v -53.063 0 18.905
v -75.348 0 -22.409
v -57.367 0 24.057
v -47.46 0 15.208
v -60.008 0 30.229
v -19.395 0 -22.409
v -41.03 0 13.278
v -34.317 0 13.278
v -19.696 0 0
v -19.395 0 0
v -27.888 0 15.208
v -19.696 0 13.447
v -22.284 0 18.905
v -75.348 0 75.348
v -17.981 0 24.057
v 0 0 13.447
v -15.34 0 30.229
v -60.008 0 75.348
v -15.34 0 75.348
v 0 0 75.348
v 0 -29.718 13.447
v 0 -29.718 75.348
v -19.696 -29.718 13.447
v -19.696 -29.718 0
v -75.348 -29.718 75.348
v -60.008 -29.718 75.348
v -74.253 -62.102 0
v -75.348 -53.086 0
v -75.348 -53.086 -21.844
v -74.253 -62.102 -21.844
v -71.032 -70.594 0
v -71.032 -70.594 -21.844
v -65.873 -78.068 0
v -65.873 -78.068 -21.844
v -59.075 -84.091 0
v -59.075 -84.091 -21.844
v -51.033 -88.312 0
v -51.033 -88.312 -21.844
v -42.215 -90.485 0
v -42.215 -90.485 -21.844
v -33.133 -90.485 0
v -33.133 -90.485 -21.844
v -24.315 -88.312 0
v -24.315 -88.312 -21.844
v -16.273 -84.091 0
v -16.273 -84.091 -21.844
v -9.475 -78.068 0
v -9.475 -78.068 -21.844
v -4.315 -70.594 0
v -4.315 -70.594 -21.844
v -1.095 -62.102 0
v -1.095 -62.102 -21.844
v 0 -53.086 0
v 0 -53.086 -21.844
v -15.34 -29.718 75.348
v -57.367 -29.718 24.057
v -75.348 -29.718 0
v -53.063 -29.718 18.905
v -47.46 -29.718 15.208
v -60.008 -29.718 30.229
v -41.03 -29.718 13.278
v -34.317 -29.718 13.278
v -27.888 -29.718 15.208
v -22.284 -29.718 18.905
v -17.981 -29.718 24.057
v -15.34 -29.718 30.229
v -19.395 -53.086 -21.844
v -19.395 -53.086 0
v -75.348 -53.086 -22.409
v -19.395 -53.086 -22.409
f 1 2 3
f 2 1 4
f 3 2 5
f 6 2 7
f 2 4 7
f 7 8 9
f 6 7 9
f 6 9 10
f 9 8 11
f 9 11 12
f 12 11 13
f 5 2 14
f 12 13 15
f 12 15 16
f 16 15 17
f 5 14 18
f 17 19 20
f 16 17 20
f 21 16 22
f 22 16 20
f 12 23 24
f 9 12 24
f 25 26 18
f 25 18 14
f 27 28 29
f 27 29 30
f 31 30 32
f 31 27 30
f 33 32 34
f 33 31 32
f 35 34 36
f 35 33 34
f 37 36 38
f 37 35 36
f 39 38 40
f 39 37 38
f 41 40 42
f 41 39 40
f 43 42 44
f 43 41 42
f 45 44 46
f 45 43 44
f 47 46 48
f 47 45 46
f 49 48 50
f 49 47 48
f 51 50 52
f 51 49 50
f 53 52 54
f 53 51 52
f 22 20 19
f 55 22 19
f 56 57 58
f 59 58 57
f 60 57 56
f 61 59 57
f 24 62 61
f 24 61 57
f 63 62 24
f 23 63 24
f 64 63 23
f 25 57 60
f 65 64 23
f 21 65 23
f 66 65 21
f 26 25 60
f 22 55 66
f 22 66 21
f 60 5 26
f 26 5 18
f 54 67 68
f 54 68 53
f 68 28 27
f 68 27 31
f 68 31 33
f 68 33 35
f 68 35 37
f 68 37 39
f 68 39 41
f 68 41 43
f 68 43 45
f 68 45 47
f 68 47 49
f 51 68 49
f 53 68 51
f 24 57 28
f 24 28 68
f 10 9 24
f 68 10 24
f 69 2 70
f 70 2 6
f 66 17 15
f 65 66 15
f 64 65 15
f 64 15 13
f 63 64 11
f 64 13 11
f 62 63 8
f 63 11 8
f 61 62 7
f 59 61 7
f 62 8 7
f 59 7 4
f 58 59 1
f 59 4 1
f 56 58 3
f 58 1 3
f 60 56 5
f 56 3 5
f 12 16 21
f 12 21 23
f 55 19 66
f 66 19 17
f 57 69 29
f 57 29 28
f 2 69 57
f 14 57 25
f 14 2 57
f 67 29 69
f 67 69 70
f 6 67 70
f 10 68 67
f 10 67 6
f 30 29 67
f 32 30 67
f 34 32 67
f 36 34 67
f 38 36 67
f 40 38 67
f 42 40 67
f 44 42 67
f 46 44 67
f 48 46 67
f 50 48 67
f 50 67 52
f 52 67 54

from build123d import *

# Parameters (mm, degrees)
F1_DEPTH = 29.718
F0_W     = 75.3477662802
F0_H     = 22.4088169634
F2_DEPTH = 53.086
F4_DEPTH = 21.844
F5_W     = 19.3952620029
F5_H     = 23.368
F6_DEPTH = 22.4098169634
F8_DEPTH = 29.719


with BuildPart() as f1:
    # F0 (on Front) → F1 (new body)
    with BuildSketch(Plane.XZ):
        with BuildLine():
            Line((-60.0075013936, 75.3477662802), (-75.3477662802, 75.3477662802))
            Line((-75.3477662802, 75.3477662802), (-75.3477662802, 0))
            Line((-75.3477662802, 0), (0, 0))
            Line((0, 0), (0, 75.3477662802))
            Line((0, 75.3477662802), (-15.3402648866, 75.3477662802))
            Line((-15.3402648866, 75.3477662802), (-15.3402648866, 30.2293412387))
            ThreePointArc((-15.3402648866, 30.2293412387), (-37.6738831401, 13.0326763907), (-60.0075013936, 30.2293412387))
            Line((-60.0075013936, 30.2293412387), (-60.0075013936, 75.3477662802))
        make_face()
    extrude(amount=F1_DEPTH)

    # F0 (on Front) → F2 (join)
    with BuildSketch(Plane.XZ):
        with Locations((-37.6738831401, -11.2044084817)):
            Rectangle(F0_W, F0_H)
    extrude(amount=F2_DEPTH)

    # F3 (on face) → F4 (join)
    with BuildSketch(Plane.XY):
        with BuildLine():
            Line((0, -53.086), (-75.3477662802, -53.086))
            ThreePointArc((-75.3477662802, -53.086), (-37.6738831401, -90.7598831401), (0, -53.086))
        make_face()
    extrude(amount=-F4_DEPTH)

    # F5 (on face) → F6 (cut, through all)
    with BuildSketch(Plane.XY):
        with Locations((-9.6976310015, -41.402)):
            Rectangle(F5_W, F5_H)
    extrude(amount=-F6_DEPTH, mode=Mode.SUBTRACT)

    # F7 (on face) → F8 (cut, through all)
    with BuildSketch(Plane.XZ.offset(29.718)):
        Polygon((0, 13.4468190372), (-19.6963120252, 13.4468190372), (-19.6963120252, 0), (-19.3952620029, 0), (-19.3952620029, -22.4088169634), (0, -22.4088169634), align=None)
    extrude(amount=-F8_DEPTH, mode=Mode.SUBTRACT)


solid = f1.part
